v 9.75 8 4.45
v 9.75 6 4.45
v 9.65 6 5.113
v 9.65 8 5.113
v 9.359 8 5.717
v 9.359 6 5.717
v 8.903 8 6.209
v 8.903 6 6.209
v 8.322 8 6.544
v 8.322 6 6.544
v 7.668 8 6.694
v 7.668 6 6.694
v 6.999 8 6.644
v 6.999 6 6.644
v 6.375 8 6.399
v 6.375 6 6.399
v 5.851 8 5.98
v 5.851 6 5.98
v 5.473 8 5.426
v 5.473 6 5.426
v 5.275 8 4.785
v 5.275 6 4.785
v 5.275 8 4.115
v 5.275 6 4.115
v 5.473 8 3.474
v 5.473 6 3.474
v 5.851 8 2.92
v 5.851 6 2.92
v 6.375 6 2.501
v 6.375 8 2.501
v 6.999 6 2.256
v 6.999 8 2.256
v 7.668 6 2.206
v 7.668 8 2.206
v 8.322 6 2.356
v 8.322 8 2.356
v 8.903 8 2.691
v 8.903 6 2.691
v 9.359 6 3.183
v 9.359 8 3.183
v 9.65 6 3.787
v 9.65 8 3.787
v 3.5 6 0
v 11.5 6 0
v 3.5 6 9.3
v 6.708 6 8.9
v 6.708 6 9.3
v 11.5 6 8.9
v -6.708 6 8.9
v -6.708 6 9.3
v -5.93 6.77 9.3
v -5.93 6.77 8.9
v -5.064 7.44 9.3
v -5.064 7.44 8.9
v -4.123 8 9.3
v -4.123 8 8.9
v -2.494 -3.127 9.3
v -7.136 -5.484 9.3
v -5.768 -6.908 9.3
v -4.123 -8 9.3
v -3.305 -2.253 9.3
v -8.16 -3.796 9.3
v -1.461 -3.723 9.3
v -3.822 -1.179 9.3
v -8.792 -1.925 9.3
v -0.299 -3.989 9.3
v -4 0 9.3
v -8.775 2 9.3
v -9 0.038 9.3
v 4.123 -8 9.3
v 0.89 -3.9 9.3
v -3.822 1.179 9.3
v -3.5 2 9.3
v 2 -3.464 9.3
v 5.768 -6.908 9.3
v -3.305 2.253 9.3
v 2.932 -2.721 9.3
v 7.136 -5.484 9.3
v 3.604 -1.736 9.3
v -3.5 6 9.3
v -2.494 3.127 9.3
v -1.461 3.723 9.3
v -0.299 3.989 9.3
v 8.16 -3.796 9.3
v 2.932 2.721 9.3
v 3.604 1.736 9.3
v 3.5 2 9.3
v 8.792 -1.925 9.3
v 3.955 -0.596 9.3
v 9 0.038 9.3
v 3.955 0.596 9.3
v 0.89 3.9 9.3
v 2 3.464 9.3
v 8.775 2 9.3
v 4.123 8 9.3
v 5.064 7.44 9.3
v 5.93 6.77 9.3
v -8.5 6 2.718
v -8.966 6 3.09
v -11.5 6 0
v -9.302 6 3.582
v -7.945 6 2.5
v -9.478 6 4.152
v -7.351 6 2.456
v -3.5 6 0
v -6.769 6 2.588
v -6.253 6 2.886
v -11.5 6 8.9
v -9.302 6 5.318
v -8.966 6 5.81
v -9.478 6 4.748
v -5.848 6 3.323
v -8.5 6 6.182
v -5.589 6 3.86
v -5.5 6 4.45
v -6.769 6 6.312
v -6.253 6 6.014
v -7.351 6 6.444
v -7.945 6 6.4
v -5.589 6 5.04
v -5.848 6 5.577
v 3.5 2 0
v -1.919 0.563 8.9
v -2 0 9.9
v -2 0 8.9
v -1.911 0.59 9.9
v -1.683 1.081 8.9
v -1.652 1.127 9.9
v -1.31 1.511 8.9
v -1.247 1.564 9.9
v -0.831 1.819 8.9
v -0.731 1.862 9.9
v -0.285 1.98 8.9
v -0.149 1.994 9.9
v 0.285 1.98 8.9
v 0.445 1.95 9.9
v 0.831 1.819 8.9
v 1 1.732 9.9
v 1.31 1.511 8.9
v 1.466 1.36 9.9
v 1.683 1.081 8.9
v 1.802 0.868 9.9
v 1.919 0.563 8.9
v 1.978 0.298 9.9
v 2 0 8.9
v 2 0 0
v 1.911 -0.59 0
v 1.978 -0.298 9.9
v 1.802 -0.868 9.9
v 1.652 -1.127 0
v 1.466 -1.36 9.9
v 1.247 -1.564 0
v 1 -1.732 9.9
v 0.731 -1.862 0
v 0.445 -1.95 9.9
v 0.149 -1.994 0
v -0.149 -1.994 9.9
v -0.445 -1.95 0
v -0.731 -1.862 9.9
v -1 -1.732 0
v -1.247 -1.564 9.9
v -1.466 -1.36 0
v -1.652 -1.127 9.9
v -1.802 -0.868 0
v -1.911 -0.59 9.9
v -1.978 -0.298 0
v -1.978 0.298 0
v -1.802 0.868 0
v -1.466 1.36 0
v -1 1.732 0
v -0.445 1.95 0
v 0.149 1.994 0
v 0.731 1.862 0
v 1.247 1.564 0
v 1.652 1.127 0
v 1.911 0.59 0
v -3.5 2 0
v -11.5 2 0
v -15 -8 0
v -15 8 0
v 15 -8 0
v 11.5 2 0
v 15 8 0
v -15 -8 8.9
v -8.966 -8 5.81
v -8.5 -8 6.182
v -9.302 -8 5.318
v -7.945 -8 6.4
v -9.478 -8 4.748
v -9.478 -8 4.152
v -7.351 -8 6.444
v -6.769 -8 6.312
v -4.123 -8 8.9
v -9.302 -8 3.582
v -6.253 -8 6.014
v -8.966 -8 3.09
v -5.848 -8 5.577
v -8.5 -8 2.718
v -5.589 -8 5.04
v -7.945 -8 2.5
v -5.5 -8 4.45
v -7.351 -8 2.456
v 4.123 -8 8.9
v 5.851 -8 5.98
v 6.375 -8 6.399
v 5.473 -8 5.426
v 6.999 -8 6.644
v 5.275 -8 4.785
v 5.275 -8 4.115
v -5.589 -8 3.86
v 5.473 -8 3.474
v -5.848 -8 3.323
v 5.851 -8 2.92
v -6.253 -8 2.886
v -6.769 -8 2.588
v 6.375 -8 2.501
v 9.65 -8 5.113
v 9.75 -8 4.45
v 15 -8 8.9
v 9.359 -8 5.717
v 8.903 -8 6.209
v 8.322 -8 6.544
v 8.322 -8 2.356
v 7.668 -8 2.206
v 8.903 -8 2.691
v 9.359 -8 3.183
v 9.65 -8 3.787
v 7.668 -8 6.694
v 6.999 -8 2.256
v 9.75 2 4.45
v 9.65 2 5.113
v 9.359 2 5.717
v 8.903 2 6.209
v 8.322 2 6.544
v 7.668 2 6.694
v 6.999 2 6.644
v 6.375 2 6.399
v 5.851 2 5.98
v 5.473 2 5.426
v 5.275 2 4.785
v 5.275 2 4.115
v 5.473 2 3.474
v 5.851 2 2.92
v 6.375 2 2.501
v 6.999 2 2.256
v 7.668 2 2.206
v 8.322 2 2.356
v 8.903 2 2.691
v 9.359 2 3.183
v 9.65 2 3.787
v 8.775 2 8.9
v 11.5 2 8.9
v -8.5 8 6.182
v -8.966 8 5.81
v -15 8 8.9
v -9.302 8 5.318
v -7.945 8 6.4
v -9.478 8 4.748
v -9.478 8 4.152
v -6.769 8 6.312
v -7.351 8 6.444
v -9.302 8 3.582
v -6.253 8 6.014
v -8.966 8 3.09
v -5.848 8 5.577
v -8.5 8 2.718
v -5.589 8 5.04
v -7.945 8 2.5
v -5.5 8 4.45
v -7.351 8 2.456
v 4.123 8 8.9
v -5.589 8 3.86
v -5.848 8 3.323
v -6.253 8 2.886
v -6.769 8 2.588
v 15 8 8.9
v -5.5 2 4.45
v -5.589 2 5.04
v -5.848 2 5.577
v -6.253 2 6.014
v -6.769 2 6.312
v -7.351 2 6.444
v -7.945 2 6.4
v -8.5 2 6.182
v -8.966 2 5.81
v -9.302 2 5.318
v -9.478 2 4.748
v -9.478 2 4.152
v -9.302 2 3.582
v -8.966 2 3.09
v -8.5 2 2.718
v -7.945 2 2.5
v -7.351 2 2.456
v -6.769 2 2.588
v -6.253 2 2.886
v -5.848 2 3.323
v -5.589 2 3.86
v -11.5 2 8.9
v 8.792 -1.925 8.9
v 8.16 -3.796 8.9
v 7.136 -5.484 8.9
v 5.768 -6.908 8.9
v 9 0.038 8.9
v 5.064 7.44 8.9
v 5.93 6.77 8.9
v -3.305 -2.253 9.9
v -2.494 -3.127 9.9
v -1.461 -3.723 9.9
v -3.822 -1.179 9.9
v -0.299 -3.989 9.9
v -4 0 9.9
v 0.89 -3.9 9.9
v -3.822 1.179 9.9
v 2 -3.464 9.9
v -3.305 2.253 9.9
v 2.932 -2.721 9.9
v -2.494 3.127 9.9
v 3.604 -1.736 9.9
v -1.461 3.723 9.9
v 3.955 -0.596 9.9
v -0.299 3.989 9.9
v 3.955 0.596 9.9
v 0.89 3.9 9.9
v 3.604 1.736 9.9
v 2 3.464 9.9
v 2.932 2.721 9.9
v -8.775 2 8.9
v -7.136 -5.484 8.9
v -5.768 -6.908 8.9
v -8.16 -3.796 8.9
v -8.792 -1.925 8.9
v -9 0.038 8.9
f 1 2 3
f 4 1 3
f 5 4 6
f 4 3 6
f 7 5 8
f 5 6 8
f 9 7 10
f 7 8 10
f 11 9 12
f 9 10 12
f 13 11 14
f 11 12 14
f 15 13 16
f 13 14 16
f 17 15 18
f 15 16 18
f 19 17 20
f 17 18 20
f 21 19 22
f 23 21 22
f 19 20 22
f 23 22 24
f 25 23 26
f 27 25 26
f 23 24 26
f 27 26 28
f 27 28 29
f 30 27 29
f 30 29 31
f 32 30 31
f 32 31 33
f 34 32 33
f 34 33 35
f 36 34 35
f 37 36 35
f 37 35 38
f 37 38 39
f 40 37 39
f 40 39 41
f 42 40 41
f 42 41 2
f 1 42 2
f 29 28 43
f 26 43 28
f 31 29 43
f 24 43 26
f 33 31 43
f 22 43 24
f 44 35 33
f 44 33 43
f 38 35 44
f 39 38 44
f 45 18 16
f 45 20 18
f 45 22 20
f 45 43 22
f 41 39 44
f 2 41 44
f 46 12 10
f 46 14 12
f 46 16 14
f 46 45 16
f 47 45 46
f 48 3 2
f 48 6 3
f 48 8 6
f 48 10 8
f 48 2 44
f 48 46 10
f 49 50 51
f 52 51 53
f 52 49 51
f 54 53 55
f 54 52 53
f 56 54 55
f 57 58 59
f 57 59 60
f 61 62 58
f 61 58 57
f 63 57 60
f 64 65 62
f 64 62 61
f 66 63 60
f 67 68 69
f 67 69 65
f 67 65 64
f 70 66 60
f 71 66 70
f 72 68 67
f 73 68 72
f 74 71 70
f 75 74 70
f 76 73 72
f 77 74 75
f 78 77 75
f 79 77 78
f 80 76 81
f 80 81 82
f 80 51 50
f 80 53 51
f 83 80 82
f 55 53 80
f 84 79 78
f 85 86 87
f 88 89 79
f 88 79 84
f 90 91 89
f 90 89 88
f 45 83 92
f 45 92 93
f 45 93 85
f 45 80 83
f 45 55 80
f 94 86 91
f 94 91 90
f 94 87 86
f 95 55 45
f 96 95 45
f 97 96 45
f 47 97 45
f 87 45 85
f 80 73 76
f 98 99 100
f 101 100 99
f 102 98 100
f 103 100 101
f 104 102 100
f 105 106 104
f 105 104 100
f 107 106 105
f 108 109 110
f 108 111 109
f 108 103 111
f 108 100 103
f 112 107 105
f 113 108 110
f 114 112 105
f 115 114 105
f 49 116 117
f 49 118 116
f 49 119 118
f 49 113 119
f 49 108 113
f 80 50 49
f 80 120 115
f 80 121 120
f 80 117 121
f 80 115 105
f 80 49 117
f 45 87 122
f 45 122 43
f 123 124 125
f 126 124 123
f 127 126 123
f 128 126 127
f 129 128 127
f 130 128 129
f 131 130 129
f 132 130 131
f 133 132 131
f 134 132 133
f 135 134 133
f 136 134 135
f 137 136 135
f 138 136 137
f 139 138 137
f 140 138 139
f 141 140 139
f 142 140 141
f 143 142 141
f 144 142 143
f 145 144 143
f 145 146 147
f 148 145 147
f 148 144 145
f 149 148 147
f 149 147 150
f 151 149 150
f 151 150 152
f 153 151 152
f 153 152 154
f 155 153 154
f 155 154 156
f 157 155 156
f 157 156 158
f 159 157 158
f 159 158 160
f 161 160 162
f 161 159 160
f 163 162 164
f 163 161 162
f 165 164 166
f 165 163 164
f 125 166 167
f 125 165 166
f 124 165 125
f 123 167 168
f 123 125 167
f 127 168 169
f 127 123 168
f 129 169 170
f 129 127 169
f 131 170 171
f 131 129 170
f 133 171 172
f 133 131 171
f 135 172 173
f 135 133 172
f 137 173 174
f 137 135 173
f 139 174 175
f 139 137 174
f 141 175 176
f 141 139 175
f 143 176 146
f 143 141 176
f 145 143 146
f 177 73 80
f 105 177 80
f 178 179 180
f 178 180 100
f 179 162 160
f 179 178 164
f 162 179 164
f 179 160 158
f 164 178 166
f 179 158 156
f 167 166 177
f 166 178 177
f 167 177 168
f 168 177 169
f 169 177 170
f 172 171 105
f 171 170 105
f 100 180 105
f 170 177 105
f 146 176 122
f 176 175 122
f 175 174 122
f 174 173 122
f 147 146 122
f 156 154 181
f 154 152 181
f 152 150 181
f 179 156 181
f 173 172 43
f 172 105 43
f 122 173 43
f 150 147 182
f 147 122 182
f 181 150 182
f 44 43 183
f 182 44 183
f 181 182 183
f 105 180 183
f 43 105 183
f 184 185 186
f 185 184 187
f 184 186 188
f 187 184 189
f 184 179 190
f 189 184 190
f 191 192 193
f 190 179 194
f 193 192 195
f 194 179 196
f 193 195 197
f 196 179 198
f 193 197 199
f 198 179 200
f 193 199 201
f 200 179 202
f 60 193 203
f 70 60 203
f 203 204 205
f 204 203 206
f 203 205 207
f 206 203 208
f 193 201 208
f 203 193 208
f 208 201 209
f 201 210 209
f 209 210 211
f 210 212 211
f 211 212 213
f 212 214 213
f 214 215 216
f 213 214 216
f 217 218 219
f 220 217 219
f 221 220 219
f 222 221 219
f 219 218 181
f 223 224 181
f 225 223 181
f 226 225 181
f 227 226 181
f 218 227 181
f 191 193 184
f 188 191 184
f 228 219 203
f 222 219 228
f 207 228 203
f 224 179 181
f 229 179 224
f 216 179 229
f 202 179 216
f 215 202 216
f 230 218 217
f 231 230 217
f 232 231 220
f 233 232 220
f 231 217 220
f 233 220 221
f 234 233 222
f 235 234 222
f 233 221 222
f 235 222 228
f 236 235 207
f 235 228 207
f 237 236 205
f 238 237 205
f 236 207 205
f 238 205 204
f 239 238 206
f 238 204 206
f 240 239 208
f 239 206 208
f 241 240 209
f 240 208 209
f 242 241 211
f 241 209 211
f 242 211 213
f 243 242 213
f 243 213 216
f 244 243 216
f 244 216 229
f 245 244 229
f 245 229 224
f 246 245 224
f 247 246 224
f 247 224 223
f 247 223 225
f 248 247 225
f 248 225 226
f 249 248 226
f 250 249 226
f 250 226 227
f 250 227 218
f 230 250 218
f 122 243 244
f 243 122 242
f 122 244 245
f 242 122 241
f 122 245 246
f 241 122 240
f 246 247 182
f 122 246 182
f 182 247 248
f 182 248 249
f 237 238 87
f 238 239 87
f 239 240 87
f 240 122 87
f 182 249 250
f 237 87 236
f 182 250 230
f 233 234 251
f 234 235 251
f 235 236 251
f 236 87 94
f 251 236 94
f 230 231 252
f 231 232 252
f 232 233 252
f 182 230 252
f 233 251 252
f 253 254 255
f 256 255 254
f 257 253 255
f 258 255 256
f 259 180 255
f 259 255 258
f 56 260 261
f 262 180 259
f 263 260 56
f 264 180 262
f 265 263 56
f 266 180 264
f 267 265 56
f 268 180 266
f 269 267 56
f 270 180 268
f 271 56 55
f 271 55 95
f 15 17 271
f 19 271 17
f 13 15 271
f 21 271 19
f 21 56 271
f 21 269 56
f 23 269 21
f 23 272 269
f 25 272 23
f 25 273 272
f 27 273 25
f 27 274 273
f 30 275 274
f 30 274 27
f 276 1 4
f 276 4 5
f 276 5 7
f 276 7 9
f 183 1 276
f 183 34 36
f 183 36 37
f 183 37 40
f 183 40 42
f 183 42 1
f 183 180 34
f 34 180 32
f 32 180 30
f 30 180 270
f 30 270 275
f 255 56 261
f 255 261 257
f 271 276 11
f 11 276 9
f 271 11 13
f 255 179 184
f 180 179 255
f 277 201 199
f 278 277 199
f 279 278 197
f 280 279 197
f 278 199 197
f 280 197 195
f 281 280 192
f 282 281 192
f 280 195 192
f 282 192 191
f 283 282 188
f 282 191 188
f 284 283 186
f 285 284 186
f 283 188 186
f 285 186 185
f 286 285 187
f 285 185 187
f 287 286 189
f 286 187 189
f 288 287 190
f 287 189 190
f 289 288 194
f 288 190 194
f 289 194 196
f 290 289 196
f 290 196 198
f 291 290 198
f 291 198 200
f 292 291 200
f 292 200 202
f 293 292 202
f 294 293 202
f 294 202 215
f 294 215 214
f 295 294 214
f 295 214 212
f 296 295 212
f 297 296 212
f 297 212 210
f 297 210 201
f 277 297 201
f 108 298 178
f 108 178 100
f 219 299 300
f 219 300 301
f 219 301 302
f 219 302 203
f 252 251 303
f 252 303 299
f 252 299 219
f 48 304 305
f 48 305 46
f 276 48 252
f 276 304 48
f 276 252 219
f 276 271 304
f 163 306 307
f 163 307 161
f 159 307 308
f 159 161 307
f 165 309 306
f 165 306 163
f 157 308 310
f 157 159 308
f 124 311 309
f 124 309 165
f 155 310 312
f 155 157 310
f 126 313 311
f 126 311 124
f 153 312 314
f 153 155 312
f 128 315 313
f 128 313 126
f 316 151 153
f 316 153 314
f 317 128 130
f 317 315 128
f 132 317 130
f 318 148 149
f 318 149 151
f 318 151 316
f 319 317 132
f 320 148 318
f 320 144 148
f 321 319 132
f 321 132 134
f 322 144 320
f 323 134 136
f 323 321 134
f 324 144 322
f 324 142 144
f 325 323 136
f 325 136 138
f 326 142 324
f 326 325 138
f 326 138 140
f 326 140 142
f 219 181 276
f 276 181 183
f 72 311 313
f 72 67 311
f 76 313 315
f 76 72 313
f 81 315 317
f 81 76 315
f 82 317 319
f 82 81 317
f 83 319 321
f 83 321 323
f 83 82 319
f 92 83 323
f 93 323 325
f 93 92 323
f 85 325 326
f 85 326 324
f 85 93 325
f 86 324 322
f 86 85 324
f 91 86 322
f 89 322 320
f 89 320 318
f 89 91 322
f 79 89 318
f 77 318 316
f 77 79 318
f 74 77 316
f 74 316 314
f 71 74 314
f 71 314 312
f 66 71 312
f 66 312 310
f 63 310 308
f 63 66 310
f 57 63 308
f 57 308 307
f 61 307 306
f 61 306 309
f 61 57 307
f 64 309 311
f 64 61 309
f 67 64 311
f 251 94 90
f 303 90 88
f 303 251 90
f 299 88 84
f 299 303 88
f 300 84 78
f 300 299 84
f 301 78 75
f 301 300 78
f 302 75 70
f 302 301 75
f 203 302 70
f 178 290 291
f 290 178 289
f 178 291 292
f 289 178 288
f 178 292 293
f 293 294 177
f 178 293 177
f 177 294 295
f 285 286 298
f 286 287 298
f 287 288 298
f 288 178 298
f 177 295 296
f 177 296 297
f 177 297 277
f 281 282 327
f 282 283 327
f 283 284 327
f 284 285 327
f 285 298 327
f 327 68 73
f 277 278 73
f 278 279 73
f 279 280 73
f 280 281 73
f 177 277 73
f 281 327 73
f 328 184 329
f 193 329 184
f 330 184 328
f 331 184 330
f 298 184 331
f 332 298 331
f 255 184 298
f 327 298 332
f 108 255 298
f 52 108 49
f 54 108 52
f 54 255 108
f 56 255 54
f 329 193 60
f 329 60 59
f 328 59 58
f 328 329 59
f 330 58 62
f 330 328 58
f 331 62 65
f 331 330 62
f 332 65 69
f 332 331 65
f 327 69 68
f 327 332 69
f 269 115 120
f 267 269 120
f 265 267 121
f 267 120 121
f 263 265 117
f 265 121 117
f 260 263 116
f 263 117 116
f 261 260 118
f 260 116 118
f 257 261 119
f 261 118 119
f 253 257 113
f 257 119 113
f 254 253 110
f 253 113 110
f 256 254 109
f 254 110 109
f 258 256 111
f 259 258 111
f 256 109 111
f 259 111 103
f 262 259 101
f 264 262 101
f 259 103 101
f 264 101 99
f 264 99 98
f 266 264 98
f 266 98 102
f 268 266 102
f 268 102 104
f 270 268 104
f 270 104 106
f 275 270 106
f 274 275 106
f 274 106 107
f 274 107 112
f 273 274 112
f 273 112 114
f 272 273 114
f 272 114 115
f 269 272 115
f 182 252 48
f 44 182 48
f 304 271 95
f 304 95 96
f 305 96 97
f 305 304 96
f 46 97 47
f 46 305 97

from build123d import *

# Parameters (mm, degrees)
SKETCH_1_W               = 30
SKETCH_1_H               = 16
SKETCH_1_R               = 2
EXTRUDE_1_DEPTH          = 8.9
SKETCH_2_R               = 2
SKETCH_2_R_2             = 2.25
CUT_EXTRUDE_1_DEPTH      = 18
SKETCH_3_W               = 8
SKETCH_3_H               = 4
CUT_EXTRUDE_2_DEPTH      = 2
CUT_EXTRUDE_2_DEPTH_BACK = 9.9
CUT_EXTRUDE_4_DEPTH      = 10.9


with BuildPart() as part:
    # Эскиз1 → Бобышка-Вытянуть1 (new body)
    with BuildSketch(Plane.XY):
        Rectangle(SKETCH_1_W, SKETCH_1_H)
        Circle(SKETCH_1_R, mode=Mode.SUBTRACT)
    extrude(amount=EXTRUDE_1_DEPTH)

    # Эскиз5 → Повернуть1 (revolve)
    with BuildSketch(Plane(origin=(0, 0, 0), x_dir=(-1, 0, 0), z_dir=(0, 1, 0))):
        Polygon((2, 8.9), (2, 9.9), (4, 9.9), (4, 9.3), (9, 9.3), (9, 8.9), align=None)
    revolve(axis=Axis((0, 0, 8.9), (0, 0, -1)))

    # Эскиз2 → Вырез-Вытянуть1 (cut, through all)
    with BuildSketch(Plane.XZ.offset(8)):
        with Locations((-7.5, 4.45)):
            Circle(SKETCH_2_R)
        with Locations((7.5, 4.45)):
            Circle(SKETCH_2_R_2)
    extrude(amount=-CUT_EXTRUDE_1_DEPTH, mode=Mode.SUBTRACT)

    # Эскиз3 → Вырез-Вытянуть2 (cut, two sides)
    with BuildSketch(Plane.XY.offset(8.9)) as cut_extrude_2_sk:
        with Locations((-7.5, 4)):
            Rectangle(SKETCH_3_W, SKETCH_3_H)
        with Locations((7.5, 4)):
            Rectangle(SKETCH_3_W, SKETCH_3_H)
    extrude(amount=CUT_EXTRUDE_2_DEPTH, mode=Mode.SUBTRACT)
    extrude(cut_extrude_2_sk.sketch, amount=-CUT_EXTRUDE_2_DEPTH_BACK, mode=Mode.SUBTRACT)

    # Эскиз7 → Вырез-Вытянуть4 (cut, through all)
    with BuildSketch(Plane(origin=(0, 0, 0), x_dir=(-1, 0, 0), z_dir=(0, 0, -1))):
        with BuildLine():
            Line((-4.123105626, 8), (4.123105626, 8))
            ThreePointArc((4.123105626, 8), (0, 9), (-4.123105626, 8))
        make_face()
        with BuildLine():
            ThreePointArc((-4.123105626, -8), (0, -9), (4.123105626, -8))
            Line((4.123105626, -8), (-4.123105626, -8))
        make_face()
    extrude(amount=-CUT_EXTRUDE_4_DEPTH, mode=Mode.SUBTRACT)


solid = part.part
